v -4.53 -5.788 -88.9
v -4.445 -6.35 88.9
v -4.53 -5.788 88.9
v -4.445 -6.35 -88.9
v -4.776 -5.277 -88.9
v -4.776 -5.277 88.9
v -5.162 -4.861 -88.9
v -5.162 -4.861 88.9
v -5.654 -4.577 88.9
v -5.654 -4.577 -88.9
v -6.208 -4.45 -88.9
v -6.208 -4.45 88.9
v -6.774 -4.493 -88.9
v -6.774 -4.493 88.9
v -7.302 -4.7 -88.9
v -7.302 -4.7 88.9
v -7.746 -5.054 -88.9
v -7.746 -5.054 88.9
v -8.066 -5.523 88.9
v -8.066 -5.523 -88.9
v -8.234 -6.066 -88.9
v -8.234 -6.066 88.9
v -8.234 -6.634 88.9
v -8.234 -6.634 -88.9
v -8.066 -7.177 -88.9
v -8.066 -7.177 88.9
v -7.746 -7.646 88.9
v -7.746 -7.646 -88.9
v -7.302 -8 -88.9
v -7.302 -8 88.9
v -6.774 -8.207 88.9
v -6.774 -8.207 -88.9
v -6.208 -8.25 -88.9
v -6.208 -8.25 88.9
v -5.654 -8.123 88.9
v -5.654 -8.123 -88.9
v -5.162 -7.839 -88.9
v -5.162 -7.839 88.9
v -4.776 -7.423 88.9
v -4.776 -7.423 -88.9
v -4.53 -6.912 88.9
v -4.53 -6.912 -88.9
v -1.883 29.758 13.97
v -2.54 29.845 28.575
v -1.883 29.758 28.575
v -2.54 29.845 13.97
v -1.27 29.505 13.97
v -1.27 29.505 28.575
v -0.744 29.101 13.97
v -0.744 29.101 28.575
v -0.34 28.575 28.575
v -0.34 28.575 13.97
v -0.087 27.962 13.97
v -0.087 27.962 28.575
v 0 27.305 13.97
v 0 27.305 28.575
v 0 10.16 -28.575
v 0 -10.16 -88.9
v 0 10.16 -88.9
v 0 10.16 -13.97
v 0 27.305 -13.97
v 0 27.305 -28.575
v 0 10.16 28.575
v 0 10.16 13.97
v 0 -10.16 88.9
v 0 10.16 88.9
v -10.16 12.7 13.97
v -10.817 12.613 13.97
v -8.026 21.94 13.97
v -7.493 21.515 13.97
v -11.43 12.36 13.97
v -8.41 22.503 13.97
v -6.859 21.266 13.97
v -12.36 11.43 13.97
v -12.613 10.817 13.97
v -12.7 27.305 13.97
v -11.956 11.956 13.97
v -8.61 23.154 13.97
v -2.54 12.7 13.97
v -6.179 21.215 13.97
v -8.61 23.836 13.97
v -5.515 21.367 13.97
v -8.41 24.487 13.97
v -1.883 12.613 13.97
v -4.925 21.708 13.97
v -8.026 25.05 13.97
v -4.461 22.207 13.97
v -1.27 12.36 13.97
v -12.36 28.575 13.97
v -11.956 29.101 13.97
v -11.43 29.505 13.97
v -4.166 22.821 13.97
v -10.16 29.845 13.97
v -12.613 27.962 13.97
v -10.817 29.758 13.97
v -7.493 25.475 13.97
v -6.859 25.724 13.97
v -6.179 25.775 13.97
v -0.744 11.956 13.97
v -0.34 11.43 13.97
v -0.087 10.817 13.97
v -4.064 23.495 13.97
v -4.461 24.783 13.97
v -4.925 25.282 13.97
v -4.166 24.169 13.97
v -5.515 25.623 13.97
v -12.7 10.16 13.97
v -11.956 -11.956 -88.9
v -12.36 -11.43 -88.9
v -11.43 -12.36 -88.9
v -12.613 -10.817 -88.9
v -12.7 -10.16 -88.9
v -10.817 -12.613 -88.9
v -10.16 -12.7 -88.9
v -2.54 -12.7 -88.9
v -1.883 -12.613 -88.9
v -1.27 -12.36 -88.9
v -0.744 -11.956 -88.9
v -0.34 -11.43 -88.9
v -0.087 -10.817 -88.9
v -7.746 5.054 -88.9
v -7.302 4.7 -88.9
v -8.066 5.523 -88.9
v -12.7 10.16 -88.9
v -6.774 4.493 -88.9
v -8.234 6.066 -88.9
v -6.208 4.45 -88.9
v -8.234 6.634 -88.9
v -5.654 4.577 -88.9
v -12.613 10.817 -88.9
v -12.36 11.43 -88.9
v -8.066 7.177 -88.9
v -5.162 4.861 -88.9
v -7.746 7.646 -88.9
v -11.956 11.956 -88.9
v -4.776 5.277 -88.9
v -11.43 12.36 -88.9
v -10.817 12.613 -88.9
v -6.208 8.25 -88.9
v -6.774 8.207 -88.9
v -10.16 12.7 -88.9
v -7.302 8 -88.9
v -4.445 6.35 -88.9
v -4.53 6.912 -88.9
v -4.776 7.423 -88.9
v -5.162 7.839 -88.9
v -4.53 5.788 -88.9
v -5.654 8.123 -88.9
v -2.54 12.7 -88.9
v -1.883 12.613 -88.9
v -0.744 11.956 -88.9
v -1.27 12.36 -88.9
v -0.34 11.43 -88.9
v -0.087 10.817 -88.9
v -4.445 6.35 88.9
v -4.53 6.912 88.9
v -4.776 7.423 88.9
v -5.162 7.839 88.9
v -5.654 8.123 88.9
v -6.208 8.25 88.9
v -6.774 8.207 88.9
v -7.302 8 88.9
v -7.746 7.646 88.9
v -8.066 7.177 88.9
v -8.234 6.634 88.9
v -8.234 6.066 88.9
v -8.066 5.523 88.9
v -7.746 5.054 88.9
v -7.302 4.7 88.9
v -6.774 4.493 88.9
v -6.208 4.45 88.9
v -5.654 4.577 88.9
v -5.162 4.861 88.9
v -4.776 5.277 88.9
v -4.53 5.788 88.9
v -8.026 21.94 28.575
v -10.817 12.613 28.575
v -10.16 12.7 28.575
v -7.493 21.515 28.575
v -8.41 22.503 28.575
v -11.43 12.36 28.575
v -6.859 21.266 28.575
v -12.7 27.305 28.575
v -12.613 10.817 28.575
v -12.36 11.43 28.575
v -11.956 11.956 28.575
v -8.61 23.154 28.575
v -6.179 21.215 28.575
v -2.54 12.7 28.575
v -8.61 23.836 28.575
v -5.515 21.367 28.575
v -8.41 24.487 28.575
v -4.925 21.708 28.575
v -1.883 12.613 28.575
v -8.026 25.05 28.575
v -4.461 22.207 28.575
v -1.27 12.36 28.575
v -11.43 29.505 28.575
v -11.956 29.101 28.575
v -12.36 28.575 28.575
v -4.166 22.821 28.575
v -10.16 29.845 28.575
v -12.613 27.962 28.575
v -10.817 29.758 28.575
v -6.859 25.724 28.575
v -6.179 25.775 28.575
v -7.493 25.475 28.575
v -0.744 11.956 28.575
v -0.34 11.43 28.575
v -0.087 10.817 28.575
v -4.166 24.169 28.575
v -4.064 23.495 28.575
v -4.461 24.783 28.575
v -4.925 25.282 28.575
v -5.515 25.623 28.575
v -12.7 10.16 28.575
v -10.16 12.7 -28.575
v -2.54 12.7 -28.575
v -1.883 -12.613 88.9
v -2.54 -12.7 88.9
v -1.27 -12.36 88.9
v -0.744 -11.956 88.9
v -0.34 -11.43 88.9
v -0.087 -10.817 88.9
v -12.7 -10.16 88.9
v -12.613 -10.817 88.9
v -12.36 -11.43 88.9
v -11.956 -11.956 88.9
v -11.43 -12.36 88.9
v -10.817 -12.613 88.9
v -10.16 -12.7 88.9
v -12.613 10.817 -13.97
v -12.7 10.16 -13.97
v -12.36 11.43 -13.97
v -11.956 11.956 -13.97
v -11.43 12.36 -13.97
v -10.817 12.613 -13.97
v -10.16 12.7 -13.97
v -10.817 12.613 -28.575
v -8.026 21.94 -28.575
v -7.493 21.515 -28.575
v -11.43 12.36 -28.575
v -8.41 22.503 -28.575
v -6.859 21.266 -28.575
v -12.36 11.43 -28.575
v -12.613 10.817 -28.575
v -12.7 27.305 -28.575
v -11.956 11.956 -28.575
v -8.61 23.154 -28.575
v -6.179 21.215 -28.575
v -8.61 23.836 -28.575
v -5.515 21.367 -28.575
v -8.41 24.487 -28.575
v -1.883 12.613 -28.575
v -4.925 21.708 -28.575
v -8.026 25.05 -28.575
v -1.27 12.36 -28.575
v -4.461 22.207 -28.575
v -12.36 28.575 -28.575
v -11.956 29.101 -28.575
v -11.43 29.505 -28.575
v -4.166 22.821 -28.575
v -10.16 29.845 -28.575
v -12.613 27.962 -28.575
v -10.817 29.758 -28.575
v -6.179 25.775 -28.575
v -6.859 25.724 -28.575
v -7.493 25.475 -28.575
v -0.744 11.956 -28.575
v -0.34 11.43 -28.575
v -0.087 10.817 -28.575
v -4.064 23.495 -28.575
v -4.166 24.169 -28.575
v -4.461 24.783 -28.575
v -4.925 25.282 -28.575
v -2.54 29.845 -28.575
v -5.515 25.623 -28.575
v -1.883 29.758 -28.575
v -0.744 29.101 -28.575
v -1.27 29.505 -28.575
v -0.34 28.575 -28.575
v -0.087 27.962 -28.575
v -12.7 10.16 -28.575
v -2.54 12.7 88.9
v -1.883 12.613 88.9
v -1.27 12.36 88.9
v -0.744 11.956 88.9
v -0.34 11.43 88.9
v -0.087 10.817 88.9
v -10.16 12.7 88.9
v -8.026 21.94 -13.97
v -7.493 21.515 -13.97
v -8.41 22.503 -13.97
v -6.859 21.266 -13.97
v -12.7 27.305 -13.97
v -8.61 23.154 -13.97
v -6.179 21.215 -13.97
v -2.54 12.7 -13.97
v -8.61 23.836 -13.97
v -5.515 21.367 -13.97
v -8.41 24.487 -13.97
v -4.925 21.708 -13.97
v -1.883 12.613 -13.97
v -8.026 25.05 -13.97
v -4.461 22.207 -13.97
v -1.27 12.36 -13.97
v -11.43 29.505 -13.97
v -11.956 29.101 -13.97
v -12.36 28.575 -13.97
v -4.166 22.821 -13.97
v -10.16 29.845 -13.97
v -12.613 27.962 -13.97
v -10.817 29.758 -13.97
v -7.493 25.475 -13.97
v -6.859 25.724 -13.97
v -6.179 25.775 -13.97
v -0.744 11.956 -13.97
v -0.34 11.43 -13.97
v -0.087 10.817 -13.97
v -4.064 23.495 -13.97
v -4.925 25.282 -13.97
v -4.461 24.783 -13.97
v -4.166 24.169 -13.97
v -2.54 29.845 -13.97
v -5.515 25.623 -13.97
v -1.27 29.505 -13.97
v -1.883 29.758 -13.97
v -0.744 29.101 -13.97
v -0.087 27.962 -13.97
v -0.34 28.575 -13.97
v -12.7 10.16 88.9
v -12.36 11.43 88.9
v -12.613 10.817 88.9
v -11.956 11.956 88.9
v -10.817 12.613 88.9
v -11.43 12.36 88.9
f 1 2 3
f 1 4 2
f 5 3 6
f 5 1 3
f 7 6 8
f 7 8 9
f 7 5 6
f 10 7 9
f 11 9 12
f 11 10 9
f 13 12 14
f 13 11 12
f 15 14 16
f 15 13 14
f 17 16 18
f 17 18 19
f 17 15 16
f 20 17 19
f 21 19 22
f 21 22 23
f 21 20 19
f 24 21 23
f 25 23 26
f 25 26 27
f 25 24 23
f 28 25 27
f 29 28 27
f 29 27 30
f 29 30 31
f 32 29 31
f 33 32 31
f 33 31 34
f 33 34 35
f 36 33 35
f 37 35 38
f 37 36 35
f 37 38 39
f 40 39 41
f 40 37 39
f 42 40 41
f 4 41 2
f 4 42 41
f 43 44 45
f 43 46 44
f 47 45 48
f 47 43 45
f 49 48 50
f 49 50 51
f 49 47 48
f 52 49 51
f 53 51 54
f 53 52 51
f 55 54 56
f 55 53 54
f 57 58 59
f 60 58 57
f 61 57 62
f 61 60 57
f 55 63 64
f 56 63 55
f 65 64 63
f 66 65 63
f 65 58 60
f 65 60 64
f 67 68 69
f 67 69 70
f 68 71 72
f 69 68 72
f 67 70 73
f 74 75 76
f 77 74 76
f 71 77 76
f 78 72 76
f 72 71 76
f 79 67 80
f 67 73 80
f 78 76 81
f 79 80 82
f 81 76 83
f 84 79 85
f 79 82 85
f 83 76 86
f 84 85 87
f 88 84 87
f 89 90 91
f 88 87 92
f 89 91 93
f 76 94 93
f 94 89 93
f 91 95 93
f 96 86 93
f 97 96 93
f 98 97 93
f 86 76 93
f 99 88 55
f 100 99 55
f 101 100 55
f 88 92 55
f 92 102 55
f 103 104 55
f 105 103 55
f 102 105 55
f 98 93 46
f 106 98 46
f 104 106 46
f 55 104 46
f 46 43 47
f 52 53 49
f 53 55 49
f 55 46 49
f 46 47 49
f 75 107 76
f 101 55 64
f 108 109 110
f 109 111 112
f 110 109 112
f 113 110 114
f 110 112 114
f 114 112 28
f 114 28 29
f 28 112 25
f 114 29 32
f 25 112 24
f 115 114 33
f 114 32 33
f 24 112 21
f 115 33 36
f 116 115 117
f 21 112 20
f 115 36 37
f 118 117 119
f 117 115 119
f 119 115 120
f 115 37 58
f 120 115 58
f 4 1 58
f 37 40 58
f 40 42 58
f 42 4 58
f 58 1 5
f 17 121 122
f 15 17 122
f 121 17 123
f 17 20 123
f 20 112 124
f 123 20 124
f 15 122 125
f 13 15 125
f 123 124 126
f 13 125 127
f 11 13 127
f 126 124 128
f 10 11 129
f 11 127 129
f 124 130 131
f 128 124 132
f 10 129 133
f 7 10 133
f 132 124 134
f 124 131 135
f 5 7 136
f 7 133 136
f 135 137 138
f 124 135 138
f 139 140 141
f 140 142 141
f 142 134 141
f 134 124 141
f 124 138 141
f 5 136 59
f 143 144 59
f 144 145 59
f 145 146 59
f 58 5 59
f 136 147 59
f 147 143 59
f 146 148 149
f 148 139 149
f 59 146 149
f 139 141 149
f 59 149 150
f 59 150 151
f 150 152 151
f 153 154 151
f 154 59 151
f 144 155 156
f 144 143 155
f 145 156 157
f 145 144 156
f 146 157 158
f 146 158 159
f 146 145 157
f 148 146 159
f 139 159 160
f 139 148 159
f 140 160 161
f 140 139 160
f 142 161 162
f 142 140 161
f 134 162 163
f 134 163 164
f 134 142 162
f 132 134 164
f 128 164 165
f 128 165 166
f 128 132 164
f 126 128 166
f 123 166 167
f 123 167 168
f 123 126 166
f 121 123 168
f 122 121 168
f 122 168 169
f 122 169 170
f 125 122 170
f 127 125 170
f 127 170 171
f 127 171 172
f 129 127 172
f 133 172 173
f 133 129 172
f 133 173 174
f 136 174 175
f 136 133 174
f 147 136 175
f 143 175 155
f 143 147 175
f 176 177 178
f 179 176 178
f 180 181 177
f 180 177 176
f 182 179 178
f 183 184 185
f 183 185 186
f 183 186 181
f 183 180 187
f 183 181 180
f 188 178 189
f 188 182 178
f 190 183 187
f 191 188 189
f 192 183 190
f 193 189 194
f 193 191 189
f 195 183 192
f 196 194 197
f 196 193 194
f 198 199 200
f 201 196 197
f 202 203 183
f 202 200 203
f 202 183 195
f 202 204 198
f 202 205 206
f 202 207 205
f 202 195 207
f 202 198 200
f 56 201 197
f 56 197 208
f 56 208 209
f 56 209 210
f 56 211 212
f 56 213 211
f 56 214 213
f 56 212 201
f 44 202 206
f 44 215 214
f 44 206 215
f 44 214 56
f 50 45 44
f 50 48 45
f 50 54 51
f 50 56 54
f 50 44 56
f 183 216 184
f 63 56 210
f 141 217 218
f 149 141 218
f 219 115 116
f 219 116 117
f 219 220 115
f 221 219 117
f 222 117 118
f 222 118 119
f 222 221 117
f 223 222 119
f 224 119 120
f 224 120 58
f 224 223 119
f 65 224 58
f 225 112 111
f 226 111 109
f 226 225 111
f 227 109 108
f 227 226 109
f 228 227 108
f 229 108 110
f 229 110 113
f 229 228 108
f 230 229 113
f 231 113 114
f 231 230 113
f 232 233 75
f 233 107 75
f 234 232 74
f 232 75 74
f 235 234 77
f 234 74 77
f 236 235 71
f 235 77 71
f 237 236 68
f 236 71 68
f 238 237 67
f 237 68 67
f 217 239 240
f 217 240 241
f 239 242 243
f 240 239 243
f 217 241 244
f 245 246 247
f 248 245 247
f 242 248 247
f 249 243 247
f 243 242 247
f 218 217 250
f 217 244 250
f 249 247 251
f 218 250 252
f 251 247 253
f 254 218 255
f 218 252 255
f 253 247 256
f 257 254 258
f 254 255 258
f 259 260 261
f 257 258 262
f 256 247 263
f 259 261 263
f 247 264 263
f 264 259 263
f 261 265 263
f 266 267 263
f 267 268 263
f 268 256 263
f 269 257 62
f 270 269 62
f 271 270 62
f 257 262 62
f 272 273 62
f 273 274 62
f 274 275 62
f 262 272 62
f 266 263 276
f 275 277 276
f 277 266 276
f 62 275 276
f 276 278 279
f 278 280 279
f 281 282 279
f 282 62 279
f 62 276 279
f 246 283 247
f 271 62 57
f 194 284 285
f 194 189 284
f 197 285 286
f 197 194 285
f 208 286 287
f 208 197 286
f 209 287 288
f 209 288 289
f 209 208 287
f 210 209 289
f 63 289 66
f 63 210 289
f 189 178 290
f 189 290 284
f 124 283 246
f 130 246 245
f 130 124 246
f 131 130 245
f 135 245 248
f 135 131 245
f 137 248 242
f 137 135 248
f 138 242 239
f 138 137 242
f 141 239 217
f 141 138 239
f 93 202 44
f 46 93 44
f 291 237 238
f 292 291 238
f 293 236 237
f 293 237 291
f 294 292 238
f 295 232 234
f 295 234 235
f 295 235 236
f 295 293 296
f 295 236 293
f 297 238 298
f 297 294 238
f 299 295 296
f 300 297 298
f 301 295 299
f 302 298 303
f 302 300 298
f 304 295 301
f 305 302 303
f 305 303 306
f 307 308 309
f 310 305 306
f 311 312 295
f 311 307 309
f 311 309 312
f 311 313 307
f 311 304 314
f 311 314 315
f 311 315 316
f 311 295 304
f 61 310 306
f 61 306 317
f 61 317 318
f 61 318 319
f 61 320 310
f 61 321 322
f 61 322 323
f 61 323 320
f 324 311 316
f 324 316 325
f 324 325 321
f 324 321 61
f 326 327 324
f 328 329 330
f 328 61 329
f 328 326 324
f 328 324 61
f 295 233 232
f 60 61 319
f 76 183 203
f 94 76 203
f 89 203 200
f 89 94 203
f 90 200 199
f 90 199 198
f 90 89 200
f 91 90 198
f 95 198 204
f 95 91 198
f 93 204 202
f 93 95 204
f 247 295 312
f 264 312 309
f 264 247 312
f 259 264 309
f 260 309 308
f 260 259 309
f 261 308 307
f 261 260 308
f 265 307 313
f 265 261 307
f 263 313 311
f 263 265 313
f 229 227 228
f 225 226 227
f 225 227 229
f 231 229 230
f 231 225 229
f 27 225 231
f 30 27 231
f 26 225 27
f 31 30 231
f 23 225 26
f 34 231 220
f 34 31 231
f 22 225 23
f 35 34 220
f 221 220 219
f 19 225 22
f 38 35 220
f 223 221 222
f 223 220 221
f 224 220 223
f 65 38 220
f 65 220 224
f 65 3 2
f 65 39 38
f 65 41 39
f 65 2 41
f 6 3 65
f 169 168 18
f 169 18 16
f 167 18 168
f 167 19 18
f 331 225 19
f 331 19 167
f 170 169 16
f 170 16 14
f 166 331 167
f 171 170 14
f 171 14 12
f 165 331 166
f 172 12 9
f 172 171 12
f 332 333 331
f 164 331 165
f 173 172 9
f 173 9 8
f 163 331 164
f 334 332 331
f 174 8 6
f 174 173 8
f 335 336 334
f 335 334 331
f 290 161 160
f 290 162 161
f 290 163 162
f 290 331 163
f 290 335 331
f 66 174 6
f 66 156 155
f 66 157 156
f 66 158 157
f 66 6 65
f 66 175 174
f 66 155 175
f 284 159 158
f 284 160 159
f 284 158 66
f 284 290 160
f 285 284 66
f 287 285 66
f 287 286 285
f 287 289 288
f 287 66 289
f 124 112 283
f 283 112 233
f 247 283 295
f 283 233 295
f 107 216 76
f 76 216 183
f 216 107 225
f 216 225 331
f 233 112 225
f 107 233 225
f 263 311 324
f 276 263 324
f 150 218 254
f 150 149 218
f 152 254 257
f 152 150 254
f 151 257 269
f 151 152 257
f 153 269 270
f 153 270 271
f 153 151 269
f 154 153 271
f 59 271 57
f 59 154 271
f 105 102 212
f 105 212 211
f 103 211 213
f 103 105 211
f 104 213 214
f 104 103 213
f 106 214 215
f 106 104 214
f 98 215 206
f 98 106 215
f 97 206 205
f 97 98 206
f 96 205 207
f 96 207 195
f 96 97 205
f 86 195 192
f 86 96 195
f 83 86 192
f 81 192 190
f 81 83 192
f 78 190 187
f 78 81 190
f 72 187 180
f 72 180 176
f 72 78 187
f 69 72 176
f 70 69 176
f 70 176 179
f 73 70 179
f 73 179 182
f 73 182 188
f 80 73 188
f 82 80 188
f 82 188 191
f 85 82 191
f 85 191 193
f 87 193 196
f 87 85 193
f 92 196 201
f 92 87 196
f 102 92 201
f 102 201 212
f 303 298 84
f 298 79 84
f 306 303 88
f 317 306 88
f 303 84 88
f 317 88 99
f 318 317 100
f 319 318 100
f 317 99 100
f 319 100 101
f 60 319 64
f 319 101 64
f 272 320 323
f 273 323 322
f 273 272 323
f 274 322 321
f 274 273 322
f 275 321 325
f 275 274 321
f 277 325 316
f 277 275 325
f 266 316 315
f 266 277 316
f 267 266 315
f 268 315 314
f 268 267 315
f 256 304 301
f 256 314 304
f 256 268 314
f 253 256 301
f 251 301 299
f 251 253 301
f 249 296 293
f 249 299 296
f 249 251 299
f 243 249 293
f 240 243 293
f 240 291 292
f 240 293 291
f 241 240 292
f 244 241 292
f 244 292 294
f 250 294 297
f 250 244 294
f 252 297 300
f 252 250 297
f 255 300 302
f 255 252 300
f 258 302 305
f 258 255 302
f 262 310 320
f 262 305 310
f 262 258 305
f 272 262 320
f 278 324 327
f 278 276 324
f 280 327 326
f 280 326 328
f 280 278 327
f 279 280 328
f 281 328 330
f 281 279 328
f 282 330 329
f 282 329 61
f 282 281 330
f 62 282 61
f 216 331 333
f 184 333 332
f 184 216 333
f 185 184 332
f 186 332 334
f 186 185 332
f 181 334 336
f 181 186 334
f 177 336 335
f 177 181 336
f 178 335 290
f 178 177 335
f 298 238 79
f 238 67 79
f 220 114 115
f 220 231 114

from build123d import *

# Parameters (mm, degrees)
SKETCH1_W           = 12.7
SKETCH1_H           = 12.7
SKETCH1_R           = 1.905
BOSS_EXTRUDE1_DEPTH = 88.9
SKETCH3_W           = 12.7
SKETCH3_H           = 17.145
SKETCH3_R           = 2.286
BOSS_EXTRUDE2_DEPTH = 28.575
SKETCH4_W           = 12.7
SKETCH4_H           = 17.145
CUT_EXTRUDE1_DEPTH  = 13.97
FILLET1_R           = 2.54


with BuildPart() as part:
    # Sketch1 → Boss-Extrude1 (new, symmetric)
    # profile 1 of 2: a face of its own
    with BuildSketch(Plane.XY):
        with Locations((-6.35, -6.35)):
            Rectangle(SKETCH1_W, SKETCH1_H)
        with Locations((-6.35, -6.35)):
            Circle(SKETCH1_R, mode=Mode.SUBTRACT)
    # profile 2 of 2: a face of its own
    with BuildSketch(Plane.XY):
        with Locations((-6.35, 6.35)):
            Rectangle(SKETCH1_W, SKETCH1_H)
        with Locations((-6.35, 6.35)):
            Circle(SKETCH1_R, mode=Mode.SUBTRACT)
    extrude(amount=BOSS_EXTRUDE1_DEPTH, both=True)

    # Sketch3 → Boss-Extrude2 (add, symmetric)
    with BuildSketch(Plane.XY):
        with Locations((-6.35, 21.2725)):
            Rectangle(SKETCH3_W, SKETCH3_H)
        with Locations((-6.35, 23.495)):
            Circle(SKETCH3_R, mode=Mode.SUBTRACT)
    extrude(amount=BOSS_EXTRUDE2_DEPTH, both=True)

    # Sketch4 → Cut-Extrude1 (cut, symmetric)
    with BuildSketch(Plane.XY):
        with Locations((-6.35, 21.2725)):
            Rectangle(SKETCH4_W, SKETCH4_H)
    extrude(amount=CUT_EXTRUDE1_DEPTH, both=True, mode=Mode.SUBTRACT)

    # Fillet1
    fillet1_edges = [part.edges().sort_by_distance(p)[0] for p in [
        (0, -12.7, 0),
        (-12.7, -12.7, 0),
        (-12.7, 12.7, -58.7375),
        (0, 12.7, -58.7375),
        (0, 12.7, 58.7375),
        (-12.7, 12.7, 58.7375),
        (0, 29.845, 21.2725),
        (-12.7, 29.845, 21.2725),
        (-12.7, 29.845, -21.2725),
        (0, 29.845, -21.2725),
        (-12.7, 12.7, 0),
        (0, 12.7, 0),
    ]]
    fillet(fillet1_edges, radius=FILLET1_R)


solid = part.part
